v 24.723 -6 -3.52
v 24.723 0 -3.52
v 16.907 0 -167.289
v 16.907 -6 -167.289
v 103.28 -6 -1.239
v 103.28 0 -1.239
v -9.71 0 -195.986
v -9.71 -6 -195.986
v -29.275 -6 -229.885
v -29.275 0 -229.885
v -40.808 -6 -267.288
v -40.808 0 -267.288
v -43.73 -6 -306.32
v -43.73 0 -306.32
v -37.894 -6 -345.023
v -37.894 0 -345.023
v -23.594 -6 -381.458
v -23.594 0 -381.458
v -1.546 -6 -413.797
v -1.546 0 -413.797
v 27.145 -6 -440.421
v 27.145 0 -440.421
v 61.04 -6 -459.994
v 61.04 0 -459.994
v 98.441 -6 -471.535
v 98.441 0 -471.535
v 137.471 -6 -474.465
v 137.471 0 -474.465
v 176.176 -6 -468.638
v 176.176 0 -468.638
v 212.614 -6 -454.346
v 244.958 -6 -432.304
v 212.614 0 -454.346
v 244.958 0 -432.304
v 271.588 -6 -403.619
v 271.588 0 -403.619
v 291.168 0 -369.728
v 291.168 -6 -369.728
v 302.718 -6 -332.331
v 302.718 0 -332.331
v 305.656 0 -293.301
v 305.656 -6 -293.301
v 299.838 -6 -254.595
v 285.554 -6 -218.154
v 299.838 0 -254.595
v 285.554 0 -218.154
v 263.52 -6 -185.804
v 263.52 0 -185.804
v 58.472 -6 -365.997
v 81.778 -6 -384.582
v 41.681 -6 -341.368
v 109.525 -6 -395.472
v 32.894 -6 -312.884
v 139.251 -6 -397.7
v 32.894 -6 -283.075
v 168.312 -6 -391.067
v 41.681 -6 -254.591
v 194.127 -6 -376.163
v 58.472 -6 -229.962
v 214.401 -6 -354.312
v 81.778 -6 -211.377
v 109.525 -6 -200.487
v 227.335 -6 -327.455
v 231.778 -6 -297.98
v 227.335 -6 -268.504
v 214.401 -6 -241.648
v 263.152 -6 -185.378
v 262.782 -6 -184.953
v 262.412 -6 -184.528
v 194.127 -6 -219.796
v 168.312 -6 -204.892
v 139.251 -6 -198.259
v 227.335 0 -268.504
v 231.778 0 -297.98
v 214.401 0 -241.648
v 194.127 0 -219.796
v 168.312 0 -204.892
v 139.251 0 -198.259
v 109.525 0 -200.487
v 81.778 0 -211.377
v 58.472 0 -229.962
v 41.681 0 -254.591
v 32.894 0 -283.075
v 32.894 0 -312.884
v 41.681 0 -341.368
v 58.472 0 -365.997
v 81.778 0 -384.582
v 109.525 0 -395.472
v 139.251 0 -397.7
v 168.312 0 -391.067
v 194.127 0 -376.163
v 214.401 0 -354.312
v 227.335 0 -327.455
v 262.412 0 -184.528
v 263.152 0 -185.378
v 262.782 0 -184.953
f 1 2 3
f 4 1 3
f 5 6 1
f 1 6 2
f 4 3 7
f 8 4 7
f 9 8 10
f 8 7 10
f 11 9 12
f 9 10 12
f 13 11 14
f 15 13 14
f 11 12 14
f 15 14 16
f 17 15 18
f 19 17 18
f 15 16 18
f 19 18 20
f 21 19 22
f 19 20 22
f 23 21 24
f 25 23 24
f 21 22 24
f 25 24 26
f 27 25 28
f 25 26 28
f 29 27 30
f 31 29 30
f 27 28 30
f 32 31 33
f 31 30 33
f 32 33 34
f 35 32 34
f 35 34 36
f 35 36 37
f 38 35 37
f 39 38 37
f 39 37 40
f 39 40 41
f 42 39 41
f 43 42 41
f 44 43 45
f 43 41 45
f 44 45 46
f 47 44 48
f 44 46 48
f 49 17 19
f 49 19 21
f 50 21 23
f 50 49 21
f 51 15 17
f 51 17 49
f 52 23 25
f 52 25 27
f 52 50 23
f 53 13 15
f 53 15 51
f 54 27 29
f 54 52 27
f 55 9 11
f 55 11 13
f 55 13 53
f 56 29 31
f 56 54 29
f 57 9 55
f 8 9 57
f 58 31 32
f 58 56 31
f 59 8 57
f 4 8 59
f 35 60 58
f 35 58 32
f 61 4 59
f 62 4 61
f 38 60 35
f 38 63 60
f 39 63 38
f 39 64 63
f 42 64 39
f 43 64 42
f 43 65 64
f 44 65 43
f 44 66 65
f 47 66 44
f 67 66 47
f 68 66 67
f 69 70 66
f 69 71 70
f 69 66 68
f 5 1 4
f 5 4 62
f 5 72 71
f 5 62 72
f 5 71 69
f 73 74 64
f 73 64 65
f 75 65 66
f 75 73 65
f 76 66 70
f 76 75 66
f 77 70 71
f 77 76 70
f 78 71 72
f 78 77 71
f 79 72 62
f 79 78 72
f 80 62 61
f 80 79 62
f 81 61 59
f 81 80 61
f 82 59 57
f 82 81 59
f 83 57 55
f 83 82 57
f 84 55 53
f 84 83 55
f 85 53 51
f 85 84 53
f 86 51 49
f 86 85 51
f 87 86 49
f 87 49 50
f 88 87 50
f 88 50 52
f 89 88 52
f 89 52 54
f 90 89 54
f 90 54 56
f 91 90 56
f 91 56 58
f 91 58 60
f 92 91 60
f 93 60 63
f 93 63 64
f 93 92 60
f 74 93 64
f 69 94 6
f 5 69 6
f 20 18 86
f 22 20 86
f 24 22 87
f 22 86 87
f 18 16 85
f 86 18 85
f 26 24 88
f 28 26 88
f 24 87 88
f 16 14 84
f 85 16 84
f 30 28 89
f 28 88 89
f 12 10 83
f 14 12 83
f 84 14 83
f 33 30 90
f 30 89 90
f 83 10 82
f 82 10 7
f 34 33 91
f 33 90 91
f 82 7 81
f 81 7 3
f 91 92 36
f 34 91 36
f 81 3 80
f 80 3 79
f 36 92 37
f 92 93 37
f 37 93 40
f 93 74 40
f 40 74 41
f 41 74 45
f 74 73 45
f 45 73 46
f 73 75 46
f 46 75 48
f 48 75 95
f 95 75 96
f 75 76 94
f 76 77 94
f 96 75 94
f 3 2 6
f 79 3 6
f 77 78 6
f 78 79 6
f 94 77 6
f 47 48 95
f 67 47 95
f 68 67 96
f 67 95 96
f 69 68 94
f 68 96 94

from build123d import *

# Parameters (mm, degrees)
F0_R     = 100
F1_DEPTH = 6


with BuildPart() as f1:
    # F0 (on Front) → F1 (new body)
    with BuildSketch(Plane.XZ):
        with BuildLine():
            Line((262.411714, -184.528433), (263.519588, -185.804495))
            ThreePointArc((263.519588, -185.804495), (262.967193, -185.165125), (262.411714, -184.528433))
        make_face()
        with BuildLine():
            Line((24.723456, -3.519507), (16.907266, -167.289172))
            ThreePointArc((16.907266, -167.289172), (117.873865, -474.095573), (263.519588, -185.804495))
            Line((263.519588, -185.804495), (262.411714, -184.528433))
            Line((262.411714, -184.528433), (103.280142, -1.238735))
            Line((103.280142, -1.238735), (24.723456, -3.519507))
        make_face()
        with Locations((131.77757, -297.979613)):
            Circle(F0_R, mode=Mode.SUBTRACT)
    extrude(amount=F1_DEPTH)


solid = f1.part
